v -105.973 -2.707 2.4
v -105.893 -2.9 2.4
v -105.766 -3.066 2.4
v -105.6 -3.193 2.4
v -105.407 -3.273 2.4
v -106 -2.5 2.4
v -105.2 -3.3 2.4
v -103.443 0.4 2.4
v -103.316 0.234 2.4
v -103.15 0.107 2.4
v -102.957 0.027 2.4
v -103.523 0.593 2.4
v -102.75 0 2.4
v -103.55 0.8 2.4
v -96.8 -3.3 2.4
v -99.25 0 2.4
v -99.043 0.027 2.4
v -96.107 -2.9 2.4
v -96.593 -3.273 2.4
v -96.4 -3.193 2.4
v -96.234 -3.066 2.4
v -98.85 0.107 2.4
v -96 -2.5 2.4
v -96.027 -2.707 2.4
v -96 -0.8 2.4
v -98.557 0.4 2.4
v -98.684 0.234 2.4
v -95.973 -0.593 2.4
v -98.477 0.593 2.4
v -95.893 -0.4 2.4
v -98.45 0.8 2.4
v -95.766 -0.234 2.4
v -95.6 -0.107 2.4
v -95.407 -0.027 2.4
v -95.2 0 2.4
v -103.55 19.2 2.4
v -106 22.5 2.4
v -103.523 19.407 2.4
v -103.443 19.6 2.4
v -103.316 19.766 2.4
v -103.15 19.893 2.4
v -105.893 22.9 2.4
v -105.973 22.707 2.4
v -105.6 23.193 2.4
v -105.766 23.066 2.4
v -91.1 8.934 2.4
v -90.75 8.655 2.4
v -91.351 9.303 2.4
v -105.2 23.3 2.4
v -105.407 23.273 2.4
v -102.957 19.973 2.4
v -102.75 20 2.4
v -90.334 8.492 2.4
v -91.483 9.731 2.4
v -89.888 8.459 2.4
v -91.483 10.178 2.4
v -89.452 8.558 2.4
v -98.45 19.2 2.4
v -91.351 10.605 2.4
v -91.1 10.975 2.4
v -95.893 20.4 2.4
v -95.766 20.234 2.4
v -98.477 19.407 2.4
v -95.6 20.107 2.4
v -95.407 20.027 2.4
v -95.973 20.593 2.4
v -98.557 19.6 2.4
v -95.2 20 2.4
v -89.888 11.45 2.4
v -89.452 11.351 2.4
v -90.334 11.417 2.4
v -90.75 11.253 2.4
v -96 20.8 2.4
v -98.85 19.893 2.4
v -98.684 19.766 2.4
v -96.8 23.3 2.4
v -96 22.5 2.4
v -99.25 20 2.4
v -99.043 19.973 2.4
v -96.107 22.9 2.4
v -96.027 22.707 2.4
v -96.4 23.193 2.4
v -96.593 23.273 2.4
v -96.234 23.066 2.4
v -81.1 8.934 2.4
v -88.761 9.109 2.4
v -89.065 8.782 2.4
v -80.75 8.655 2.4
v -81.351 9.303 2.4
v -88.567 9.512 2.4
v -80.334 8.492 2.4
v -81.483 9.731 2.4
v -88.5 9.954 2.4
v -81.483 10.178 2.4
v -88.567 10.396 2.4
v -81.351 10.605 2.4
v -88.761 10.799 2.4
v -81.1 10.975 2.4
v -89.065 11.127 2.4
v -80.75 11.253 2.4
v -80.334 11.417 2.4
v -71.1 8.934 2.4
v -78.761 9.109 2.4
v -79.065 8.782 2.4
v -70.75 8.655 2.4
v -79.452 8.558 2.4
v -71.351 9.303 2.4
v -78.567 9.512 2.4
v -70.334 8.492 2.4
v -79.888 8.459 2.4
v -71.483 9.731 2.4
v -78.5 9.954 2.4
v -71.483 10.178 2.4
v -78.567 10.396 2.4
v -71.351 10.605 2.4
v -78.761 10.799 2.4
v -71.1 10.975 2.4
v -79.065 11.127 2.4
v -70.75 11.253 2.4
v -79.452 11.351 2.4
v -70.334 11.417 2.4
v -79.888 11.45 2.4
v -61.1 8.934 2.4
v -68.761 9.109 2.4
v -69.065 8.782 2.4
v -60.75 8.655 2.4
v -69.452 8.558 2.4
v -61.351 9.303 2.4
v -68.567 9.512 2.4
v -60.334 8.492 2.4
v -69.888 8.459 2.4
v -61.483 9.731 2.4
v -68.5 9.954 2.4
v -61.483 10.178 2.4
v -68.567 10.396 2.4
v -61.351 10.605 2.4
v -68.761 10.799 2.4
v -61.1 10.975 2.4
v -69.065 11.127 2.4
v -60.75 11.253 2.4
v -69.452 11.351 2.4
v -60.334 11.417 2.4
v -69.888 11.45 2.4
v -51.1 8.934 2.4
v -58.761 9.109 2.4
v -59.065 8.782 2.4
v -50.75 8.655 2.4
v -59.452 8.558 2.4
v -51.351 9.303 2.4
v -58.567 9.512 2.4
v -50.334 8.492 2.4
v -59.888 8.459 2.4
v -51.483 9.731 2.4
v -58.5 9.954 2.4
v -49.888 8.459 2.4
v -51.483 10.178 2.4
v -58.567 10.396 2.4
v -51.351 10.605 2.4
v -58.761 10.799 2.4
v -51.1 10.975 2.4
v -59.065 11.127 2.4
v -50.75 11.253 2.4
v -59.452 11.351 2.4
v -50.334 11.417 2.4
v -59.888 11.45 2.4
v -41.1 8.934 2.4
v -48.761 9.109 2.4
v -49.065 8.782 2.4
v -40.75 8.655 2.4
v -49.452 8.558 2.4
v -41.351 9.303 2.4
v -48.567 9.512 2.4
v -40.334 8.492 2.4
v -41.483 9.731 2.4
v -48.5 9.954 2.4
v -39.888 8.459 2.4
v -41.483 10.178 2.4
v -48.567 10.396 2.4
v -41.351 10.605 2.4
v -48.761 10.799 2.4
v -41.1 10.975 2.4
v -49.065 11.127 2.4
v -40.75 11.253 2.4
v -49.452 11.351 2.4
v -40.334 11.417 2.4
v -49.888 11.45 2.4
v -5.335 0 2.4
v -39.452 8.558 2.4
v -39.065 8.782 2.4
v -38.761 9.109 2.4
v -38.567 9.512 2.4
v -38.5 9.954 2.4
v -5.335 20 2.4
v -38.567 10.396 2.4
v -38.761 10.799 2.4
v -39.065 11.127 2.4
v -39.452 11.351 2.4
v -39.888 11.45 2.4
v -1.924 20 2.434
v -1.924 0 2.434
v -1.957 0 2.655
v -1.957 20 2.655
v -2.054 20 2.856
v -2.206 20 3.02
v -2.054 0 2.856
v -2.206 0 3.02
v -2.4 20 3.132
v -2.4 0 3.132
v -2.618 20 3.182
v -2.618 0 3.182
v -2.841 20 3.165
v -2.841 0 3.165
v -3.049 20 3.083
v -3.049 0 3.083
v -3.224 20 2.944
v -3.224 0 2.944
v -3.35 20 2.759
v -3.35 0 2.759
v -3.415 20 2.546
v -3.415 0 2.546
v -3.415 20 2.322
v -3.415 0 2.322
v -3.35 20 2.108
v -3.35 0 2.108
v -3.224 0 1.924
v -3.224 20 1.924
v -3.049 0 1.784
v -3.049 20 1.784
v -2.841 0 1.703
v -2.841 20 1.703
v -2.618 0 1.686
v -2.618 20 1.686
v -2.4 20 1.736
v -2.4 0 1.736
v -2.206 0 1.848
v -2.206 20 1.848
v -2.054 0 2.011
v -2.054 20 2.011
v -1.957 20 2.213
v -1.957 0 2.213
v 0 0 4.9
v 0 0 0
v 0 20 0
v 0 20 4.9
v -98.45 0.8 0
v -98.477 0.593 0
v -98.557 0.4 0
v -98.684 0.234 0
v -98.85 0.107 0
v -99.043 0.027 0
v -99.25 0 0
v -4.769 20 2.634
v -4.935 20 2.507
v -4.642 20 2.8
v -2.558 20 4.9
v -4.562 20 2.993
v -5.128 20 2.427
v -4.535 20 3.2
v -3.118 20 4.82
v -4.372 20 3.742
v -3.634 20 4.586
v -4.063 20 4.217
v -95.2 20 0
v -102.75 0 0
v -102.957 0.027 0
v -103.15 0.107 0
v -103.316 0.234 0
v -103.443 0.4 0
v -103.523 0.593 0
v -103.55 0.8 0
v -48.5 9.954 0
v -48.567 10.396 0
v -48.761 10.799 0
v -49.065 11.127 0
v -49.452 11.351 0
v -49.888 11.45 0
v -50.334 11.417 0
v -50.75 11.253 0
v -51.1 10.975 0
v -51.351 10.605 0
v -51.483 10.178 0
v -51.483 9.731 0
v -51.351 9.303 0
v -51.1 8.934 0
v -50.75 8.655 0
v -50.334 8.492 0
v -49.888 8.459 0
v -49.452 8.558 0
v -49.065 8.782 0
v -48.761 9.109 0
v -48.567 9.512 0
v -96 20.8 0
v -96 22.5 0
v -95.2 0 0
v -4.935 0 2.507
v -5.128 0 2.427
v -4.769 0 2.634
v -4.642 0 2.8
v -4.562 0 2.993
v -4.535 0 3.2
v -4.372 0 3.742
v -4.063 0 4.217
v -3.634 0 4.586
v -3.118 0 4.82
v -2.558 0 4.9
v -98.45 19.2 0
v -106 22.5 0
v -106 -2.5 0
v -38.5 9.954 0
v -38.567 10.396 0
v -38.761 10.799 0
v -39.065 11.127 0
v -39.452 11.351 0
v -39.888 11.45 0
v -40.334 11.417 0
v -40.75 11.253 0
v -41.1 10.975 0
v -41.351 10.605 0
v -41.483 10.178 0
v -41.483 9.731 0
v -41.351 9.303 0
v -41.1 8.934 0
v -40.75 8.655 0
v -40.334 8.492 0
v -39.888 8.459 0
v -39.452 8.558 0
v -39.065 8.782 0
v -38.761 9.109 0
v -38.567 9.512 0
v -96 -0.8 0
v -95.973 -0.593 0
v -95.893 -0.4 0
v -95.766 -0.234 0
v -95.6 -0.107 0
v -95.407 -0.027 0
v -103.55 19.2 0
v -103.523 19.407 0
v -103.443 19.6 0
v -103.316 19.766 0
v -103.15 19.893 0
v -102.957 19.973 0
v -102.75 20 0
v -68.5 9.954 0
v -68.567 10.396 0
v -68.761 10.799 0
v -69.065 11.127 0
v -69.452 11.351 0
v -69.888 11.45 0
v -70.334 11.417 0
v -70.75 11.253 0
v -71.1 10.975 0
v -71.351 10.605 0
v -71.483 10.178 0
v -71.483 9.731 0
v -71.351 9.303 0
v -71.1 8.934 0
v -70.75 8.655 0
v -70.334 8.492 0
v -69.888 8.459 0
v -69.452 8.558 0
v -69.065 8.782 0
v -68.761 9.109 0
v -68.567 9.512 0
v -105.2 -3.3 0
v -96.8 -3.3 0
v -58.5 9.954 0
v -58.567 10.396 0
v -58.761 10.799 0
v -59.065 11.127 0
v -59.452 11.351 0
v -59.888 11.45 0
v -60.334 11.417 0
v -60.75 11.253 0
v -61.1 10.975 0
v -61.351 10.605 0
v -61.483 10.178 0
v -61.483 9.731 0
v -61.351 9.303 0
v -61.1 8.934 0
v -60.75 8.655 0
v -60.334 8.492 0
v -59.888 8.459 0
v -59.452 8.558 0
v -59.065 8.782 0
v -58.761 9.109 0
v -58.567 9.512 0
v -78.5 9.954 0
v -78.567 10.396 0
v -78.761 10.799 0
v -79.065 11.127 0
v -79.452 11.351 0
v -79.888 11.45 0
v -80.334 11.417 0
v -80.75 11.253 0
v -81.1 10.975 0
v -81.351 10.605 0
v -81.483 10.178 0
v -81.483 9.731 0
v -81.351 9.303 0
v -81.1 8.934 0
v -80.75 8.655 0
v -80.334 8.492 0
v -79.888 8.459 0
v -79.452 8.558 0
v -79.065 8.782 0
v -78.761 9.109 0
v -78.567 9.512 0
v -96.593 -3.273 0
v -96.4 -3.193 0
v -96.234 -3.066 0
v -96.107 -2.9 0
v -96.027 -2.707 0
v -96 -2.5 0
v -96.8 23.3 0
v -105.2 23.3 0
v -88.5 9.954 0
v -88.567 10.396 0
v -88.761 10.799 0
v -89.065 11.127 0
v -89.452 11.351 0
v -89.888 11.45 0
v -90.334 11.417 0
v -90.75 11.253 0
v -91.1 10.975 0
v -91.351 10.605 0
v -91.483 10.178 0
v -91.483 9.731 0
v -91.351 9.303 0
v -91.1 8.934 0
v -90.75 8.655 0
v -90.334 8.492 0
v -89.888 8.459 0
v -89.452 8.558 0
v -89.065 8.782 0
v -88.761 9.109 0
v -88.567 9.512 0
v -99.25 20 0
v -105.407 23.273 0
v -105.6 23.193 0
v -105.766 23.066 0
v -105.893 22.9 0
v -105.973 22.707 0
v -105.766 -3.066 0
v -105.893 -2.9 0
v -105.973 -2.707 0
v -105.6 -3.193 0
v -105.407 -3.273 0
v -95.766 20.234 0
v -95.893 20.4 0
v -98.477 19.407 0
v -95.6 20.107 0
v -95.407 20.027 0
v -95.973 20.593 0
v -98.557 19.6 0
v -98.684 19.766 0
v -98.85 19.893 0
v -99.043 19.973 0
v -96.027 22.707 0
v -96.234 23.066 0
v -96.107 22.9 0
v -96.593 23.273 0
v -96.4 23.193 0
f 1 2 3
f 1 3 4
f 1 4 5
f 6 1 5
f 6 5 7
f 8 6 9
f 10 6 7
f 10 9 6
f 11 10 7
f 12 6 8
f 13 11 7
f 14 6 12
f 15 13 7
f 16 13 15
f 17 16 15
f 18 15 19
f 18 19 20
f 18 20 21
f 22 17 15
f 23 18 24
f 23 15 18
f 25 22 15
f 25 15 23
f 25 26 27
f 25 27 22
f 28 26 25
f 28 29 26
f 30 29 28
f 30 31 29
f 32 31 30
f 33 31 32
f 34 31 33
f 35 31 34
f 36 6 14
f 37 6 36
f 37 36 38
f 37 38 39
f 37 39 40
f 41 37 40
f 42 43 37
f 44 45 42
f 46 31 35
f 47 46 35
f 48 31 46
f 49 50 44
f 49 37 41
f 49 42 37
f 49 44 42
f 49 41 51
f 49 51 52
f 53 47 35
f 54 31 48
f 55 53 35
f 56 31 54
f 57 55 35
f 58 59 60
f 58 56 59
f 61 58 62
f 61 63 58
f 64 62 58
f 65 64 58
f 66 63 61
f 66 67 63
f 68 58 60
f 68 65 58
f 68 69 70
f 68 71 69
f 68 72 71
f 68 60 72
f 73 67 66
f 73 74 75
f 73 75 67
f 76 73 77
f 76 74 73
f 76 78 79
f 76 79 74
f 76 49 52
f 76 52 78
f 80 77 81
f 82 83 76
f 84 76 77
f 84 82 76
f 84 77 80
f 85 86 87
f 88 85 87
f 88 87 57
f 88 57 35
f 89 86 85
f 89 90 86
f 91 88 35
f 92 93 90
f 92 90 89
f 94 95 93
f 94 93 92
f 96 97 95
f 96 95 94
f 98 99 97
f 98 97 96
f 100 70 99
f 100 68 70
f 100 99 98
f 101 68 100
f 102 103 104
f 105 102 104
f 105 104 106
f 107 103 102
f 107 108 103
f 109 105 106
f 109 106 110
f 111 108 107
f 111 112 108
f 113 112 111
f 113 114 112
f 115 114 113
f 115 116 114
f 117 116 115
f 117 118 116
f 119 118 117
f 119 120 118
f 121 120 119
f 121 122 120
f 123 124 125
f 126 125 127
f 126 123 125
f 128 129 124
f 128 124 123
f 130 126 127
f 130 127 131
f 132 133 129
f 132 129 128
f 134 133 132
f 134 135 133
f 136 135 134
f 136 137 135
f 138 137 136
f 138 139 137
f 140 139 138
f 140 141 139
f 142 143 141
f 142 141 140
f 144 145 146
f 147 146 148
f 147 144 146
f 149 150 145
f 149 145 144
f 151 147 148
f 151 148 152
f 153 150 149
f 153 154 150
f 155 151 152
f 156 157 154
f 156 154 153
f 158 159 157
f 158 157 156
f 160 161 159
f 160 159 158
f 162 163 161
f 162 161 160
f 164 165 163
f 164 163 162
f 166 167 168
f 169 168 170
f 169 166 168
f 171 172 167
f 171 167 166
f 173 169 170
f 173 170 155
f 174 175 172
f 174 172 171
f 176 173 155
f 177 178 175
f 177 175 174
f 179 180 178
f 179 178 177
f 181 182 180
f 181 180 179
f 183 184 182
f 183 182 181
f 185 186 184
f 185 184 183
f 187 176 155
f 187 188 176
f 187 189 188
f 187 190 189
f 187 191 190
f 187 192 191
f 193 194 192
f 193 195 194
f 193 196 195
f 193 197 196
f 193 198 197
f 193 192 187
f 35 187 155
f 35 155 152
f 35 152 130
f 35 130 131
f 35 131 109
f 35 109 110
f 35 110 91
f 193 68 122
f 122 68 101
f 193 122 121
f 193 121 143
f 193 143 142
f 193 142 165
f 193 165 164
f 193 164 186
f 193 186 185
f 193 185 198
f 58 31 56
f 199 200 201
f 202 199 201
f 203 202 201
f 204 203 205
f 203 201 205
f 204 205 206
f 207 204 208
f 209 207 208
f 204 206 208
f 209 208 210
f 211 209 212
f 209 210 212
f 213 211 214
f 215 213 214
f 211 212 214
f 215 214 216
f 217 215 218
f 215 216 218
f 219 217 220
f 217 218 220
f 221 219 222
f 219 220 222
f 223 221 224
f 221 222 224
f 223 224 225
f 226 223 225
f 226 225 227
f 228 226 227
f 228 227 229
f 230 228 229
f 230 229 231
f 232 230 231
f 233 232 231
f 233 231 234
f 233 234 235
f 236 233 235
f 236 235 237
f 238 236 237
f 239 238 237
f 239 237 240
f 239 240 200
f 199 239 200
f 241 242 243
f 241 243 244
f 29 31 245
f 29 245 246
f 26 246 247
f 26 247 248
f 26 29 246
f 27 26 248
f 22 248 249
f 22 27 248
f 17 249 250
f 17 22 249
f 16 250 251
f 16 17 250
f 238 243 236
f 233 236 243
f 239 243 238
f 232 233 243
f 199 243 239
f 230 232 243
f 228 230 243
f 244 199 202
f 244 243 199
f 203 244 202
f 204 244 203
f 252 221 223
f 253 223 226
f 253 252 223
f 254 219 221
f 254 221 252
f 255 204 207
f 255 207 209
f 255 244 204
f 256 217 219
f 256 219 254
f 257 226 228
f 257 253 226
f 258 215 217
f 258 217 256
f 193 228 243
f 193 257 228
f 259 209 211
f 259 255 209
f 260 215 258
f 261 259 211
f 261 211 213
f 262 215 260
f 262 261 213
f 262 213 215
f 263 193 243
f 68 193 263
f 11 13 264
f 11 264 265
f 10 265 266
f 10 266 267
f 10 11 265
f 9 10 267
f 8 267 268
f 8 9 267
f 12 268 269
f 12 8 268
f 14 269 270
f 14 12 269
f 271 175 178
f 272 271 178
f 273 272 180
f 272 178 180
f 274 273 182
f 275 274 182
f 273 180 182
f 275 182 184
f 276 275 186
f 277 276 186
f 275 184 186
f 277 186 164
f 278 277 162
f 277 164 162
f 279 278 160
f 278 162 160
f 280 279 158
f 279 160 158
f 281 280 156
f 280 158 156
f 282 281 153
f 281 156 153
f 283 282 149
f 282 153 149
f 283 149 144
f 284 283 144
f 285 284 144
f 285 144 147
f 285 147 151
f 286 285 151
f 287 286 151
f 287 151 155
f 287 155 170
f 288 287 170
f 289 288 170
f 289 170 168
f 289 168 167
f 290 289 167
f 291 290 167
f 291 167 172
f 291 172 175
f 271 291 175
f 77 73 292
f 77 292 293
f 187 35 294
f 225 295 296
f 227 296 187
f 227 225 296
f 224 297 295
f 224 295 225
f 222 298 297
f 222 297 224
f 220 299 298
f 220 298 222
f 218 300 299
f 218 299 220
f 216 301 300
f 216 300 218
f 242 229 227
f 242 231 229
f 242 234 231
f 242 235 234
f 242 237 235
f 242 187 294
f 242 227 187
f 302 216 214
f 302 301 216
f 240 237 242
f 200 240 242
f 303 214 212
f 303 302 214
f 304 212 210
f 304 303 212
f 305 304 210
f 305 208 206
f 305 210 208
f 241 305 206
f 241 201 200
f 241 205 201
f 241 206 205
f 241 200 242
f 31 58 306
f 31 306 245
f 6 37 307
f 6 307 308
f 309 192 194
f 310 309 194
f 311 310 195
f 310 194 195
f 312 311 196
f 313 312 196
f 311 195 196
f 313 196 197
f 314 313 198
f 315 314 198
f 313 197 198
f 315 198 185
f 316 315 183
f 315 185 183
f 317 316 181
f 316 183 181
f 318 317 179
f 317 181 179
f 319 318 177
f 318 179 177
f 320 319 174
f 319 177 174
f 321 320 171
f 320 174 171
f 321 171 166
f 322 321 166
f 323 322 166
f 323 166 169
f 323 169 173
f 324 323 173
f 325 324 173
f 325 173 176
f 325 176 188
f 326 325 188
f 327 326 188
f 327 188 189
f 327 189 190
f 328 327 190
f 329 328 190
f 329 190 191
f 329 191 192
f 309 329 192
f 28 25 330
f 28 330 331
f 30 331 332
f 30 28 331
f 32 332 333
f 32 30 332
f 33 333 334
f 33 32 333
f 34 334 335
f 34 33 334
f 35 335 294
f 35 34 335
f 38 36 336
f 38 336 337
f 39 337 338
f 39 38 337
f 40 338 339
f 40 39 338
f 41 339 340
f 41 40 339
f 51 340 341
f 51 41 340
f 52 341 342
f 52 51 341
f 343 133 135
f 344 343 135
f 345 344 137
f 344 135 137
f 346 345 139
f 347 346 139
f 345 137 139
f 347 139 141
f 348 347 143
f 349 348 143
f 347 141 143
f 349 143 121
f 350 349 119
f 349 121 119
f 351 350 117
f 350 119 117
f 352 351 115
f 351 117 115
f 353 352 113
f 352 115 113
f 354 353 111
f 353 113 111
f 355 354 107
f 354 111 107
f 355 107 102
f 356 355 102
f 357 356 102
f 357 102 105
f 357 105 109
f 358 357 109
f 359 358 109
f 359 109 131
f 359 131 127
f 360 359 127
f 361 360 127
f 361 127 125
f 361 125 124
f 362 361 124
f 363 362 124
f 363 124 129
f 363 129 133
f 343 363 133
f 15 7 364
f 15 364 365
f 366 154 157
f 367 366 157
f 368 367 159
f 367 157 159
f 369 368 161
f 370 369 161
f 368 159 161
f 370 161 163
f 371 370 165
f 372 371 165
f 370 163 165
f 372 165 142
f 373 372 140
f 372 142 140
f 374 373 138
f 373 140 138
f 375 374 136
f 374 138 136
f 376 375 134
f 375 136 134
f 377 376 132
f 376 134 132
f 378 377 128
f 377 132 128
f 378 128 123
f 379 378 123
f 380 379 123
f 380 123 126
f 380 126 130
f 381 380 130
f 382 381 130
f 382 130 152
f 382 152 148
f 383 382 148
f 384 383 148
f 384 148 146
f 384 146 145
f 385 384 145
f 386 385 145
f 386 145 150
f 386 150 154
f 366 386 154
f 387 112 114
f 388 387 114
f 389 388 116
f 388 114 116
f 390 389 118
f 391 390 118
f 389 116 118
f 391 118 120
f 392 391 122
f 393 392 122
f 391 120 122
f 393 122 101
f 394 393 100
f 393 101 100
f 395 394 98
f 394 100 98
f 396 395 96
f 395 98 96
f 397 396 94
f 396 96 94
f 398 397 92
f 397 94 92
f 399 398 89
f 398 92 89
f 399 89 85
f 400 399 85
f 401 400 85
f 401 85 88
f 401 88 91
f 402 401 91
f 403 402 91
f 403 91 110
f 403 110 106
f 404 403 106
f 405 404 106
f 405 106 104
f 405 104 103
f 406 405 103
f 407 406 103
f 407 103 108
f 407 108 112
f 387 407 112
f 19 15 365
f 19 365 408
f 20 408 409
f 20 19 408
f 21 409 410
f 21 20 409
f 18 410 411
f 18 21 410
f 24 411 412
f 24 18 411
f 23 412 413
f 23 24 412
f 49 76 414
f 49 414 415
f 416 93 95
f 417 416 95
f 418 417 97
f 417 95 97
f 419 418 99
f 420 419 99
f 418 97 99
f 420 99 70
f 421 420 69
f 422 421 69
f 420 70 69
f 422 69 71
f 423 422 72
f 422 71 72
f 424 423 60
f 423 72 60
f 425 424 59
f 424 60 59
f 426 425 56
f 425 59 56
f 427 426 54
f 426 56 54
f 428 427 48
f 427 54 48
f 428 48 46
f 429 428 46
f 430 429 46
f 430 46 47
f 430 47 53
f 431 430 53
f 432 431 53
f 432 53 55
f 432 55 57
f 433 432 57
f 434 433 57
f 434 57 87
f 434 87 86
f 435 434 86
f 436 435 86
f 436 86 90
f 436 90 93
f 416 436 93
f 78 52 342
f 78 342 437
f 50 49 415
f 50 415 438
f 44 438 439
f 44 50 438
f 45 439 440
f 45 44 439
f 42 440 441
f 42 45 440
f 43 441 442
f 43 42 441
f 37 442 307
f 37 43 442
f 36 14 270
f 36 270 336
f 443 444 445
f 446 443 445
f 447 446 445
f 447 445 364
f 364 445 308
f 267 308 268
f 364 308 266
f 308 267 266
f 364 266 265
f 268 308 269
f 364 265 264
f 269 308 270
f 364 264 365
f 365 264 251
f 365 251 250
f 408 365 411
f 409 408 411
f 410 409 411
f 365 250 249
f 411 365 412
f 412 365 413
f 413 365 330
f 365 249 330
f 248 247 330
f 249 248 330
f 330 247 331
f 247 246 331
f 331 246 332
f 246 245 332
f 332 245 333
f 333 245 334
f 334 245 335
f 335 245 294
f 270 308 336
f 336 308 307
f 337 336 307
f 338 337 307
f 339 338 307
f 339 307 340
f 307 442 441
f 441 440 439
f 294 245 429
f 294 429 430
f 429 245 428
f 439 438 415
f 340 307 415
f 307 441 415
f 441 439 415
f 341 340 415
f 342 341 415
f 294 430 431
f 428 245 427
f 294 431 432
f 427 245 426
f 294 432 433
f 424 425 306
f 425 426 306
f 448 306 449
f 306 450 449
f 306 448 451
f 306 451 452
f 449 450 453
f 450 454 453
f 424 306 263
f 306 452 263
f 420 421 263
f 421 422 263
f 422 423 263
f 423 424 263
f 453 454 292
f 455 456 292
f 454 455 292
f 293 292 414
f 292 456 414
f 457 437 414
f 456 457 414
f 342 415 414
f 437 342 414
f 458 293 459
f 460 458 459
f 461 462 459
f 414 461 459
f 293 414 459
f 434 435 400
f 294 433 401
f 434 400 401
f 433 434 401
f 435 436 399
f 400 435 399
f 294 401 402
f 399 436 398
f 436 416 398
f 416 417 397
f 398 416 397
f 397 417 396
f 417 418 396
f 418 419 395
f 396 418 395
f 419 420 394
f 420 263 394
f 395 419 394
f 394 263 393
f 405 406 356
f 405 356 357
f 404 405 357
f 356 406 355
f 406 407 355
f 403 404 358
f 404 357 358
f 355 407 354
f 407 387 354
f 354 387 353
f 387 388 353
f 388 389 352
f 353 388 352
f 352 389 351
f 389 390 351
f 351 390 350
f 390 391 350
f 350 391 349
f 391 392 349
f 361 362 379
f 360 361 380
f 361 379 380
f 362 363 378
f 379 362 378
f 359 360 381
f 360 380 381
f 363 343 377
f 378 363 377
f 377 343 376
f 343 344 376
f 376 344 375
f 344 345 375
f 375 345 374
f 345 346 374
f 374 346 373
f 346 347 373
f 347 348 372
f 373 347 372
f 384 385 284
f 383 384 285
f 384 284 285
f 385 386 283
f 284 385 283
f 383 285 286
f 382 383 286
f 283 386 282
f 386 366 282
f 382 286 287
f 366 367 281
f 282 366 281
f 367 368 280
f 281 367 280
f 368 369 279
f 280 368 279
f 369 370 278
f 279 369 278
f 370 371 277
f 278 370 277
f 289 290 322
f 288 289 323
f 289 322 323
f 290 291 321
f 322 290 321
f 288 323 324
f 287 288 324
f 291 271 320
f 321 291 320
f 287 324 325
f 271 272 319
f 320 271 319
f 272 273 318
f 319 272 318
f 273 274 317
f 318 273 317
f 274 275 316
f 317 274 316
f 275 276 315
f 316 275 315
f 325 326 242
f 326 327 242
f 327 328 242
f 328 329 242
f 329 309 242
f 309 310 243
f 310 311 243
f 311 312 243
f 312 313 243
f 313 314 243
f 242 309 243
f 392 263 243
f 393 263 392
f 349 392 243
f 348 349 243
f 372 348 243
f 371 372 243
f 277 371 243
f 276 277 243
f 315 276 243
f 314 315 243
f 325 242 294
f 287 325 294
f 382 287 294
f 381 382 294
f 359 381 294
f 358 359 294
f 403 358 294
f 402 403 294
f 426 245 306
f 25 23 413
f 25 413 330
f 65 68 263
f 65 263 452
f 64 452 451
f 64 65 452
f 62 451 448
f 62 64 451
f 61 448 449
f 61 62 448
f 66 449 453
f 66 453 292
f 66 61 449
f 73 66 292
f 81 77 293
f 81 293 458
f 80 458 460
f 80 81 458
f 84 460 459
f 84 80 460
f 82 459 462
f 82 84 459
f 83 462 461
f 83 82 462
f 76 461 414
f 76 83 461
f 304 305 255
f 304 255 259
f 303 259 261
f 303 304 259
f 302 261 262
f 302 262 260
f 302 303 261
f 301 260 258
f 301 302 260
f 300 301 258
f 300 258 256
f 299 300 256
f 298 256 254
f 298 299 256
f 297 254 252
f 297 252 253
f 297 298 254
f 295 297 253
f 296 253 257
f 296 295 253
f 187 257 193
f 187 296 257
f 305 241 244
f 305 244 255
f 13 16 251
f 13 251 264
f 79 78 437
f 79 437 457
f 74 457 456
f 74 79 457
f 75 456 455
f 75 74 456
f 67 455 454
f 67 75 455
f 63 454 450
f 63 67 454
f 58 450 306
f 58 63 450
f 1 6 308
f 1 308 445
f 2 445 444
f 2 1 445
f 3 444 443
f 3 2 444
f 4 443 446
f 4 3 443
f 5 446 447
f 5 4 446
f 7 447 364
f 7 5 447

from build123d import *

# Parameters (mm, degrees)
F0_W      = 96
F0_H      = 20
F1_DEPTH  = 2.4
F4_DEPTH  = 20
F5_R      = 0.75
F6_DEPTH  = 20.001
F7_R      = 1.5
F8_DEPTH  = 2.401
F10_DEPTH = 2.4
F11_DEPTH = 2.401


with BuildPart() as f1:
    # F0 (on Top) → F1 (new body)
    with BuildSketch(Plane.XY):
        with Locations((-48, 10)):
            Rectangle(F0_W, F0_H)
    extrude(amount=F1_DEPTH)

    # F3 (on face) → F4 (join)
    with BuildSketch(Plane.XZ):
        with BuildLine():
            Line((-4.53507, 2.4), (0, 2.4))
            Line((0, 2.4), (0, 4.9))
            Line((0, 4.9), (-2.557698, 4.9))
            ThreePointArc((-2.557698, 4.9), (-3.861539, 4.416575), (-4.53507, 3.2))
            ThreePointArc((-4.53507, 3.2), (-4.769385, 2.634315), (-5.33507, 2.4))
            Line((-5.33507, 2.4), (-4.53507, 2.4))
        make_face()
    extrude(amount=-F4_DEPTH)

    # F5 (on face) → F6 (cut, through all)
    with BuildSketch(Plane.XZ):
        with Locations((-2.673816, 2.433896)):
            Circle(F5_R)
    extrude(amount=-F6_DEPTH, mode=Mode.SUBTRACT)

    # F7 (on face) → F8 (cut, through all)
    with BuildSketch(Plane.XY.offset(2.4)):
        with BuildLine():
            ThreePointArc((-91.5, 9.954306), (-90, 8.454306), (-88.5, 9.954306))
            ThreePointArc((-88.5, 9.954306), (-90, 11.454306), (-91.5, 9.954306))
        make_face()
        with Locations((-80, 9.954306)):
            Circle(F7_R)
        with Locations((-70, 9.954306)):
            Circle(F7_R)
        with Locations((-60, 9.954306)):
            Circle(F7_R)
        with Locations((-50, 9.954306)):
            Circle(F7_R)
        with Locations((-40, 9.954306)):
            Circle(F7_R)
    extrude(amount=-F8_DEPTH, mode=Mode.SUBTRACT)

    # F9 (on face) → F10 (join)
    with BuildSketch(Plane.XY.offset(2.4)):
        with BuildLine():
            Line((-95.2, 0), (-6, 0))
            Line((-6, 0), (-6, 20))
            Line((-6, 20), (-95.2, 20))
            ThreePointArc((-95.2, 20), (-95.765685, 20.234315), (-96, 20.8))
            Line((-96, 20.8), (-96, 22.5))
            ThreePointArc((-96, 22.5), (-96.234315, 23.065685), (-96.8, 23.3))
            Line((-96.8, 23.3), (-105.2, 23.3))
            ThreePointArc((-105.2, 23.3), (-105.765685, 23.065685), (-106, 22.5))
            Line((-106, 22.5), (-106, -2.5))
            ThreePointArc((-106, -2.5), (-105.765685, -3.065685), (-105.2, -3.3))
            Line((-105.2, -3.3), (-103.3, -3.3))
            Line((-103.3, -3.3), (-98.7, -3.3))
            Line((-98.7, -3.3), (-96.8, -3.3))
            ThreePointArc((-96.8, -3.3), (-96.234315, -3.065685), (-96, -2.5))
            Line((-96, -2.5), (-96, -0.8))
            ThreePointArc((-96, -0.8), (-95.765685, -0.234315), (-95.2, 0))
        make_face()
        with BuildLine():
            ThreePointArc((-103.550001, 19.2), (-103.315687, 19.765685), (-102.750001, 20))
            Line((-102.750001, 20), (-99.249999, 20))
            ThreePointArc((-99.249999, 20), (-98.684314, 19.765686), (-98.449999, 19.2))
            Line((-98.449999, 19.2), (-98.449999, 0.8))
            ThreePointArc((-98.449999, 0.8), (-98.684314, 0.234315), (-99.249999, 0))
            Line((-99.249999, 0), (-102.749999, 0))
            ThreePointArc((-102.749999, 0), (-103.315684, 0.234315), (-103.549999, 0.8))
            Line((-103.549999, 0.8), (-103.550001, 19.2))
        make_face(mode=Mode.SUBTRACT)
    extrude(amount=-F10_DEPTH)

    # F7 (on face) → F11 (cut, through all)
    with BuildSketch(Plane.XY.offset(2.4)):
        with BuildLine():
            ThreePointArc((-91.5, 9.954306), (-90, 8.454306), (-88.5, 9.954306))
            ThreePointArc((-88.5, 9.954306), (-90, 11.454306), (-91.5, 9.954306))
        make_face()
        with Locations((-80, 9.954306)):
            Circle(F7_R)
        with Locations((-70, 9.954306)):
            Circle(F7_R)
        with Locations((-60, 9.954306)):
            Circle(F7_R)
        with Locations((-50, 9.954306)):
            Circle(F7_R)
        with Locations((-40, 9.954306)):
            Circle(F7_R)
    extrude(amount=-F11_DEPTH, mode=Mode.SUBTRACT)


solid = f1.part
